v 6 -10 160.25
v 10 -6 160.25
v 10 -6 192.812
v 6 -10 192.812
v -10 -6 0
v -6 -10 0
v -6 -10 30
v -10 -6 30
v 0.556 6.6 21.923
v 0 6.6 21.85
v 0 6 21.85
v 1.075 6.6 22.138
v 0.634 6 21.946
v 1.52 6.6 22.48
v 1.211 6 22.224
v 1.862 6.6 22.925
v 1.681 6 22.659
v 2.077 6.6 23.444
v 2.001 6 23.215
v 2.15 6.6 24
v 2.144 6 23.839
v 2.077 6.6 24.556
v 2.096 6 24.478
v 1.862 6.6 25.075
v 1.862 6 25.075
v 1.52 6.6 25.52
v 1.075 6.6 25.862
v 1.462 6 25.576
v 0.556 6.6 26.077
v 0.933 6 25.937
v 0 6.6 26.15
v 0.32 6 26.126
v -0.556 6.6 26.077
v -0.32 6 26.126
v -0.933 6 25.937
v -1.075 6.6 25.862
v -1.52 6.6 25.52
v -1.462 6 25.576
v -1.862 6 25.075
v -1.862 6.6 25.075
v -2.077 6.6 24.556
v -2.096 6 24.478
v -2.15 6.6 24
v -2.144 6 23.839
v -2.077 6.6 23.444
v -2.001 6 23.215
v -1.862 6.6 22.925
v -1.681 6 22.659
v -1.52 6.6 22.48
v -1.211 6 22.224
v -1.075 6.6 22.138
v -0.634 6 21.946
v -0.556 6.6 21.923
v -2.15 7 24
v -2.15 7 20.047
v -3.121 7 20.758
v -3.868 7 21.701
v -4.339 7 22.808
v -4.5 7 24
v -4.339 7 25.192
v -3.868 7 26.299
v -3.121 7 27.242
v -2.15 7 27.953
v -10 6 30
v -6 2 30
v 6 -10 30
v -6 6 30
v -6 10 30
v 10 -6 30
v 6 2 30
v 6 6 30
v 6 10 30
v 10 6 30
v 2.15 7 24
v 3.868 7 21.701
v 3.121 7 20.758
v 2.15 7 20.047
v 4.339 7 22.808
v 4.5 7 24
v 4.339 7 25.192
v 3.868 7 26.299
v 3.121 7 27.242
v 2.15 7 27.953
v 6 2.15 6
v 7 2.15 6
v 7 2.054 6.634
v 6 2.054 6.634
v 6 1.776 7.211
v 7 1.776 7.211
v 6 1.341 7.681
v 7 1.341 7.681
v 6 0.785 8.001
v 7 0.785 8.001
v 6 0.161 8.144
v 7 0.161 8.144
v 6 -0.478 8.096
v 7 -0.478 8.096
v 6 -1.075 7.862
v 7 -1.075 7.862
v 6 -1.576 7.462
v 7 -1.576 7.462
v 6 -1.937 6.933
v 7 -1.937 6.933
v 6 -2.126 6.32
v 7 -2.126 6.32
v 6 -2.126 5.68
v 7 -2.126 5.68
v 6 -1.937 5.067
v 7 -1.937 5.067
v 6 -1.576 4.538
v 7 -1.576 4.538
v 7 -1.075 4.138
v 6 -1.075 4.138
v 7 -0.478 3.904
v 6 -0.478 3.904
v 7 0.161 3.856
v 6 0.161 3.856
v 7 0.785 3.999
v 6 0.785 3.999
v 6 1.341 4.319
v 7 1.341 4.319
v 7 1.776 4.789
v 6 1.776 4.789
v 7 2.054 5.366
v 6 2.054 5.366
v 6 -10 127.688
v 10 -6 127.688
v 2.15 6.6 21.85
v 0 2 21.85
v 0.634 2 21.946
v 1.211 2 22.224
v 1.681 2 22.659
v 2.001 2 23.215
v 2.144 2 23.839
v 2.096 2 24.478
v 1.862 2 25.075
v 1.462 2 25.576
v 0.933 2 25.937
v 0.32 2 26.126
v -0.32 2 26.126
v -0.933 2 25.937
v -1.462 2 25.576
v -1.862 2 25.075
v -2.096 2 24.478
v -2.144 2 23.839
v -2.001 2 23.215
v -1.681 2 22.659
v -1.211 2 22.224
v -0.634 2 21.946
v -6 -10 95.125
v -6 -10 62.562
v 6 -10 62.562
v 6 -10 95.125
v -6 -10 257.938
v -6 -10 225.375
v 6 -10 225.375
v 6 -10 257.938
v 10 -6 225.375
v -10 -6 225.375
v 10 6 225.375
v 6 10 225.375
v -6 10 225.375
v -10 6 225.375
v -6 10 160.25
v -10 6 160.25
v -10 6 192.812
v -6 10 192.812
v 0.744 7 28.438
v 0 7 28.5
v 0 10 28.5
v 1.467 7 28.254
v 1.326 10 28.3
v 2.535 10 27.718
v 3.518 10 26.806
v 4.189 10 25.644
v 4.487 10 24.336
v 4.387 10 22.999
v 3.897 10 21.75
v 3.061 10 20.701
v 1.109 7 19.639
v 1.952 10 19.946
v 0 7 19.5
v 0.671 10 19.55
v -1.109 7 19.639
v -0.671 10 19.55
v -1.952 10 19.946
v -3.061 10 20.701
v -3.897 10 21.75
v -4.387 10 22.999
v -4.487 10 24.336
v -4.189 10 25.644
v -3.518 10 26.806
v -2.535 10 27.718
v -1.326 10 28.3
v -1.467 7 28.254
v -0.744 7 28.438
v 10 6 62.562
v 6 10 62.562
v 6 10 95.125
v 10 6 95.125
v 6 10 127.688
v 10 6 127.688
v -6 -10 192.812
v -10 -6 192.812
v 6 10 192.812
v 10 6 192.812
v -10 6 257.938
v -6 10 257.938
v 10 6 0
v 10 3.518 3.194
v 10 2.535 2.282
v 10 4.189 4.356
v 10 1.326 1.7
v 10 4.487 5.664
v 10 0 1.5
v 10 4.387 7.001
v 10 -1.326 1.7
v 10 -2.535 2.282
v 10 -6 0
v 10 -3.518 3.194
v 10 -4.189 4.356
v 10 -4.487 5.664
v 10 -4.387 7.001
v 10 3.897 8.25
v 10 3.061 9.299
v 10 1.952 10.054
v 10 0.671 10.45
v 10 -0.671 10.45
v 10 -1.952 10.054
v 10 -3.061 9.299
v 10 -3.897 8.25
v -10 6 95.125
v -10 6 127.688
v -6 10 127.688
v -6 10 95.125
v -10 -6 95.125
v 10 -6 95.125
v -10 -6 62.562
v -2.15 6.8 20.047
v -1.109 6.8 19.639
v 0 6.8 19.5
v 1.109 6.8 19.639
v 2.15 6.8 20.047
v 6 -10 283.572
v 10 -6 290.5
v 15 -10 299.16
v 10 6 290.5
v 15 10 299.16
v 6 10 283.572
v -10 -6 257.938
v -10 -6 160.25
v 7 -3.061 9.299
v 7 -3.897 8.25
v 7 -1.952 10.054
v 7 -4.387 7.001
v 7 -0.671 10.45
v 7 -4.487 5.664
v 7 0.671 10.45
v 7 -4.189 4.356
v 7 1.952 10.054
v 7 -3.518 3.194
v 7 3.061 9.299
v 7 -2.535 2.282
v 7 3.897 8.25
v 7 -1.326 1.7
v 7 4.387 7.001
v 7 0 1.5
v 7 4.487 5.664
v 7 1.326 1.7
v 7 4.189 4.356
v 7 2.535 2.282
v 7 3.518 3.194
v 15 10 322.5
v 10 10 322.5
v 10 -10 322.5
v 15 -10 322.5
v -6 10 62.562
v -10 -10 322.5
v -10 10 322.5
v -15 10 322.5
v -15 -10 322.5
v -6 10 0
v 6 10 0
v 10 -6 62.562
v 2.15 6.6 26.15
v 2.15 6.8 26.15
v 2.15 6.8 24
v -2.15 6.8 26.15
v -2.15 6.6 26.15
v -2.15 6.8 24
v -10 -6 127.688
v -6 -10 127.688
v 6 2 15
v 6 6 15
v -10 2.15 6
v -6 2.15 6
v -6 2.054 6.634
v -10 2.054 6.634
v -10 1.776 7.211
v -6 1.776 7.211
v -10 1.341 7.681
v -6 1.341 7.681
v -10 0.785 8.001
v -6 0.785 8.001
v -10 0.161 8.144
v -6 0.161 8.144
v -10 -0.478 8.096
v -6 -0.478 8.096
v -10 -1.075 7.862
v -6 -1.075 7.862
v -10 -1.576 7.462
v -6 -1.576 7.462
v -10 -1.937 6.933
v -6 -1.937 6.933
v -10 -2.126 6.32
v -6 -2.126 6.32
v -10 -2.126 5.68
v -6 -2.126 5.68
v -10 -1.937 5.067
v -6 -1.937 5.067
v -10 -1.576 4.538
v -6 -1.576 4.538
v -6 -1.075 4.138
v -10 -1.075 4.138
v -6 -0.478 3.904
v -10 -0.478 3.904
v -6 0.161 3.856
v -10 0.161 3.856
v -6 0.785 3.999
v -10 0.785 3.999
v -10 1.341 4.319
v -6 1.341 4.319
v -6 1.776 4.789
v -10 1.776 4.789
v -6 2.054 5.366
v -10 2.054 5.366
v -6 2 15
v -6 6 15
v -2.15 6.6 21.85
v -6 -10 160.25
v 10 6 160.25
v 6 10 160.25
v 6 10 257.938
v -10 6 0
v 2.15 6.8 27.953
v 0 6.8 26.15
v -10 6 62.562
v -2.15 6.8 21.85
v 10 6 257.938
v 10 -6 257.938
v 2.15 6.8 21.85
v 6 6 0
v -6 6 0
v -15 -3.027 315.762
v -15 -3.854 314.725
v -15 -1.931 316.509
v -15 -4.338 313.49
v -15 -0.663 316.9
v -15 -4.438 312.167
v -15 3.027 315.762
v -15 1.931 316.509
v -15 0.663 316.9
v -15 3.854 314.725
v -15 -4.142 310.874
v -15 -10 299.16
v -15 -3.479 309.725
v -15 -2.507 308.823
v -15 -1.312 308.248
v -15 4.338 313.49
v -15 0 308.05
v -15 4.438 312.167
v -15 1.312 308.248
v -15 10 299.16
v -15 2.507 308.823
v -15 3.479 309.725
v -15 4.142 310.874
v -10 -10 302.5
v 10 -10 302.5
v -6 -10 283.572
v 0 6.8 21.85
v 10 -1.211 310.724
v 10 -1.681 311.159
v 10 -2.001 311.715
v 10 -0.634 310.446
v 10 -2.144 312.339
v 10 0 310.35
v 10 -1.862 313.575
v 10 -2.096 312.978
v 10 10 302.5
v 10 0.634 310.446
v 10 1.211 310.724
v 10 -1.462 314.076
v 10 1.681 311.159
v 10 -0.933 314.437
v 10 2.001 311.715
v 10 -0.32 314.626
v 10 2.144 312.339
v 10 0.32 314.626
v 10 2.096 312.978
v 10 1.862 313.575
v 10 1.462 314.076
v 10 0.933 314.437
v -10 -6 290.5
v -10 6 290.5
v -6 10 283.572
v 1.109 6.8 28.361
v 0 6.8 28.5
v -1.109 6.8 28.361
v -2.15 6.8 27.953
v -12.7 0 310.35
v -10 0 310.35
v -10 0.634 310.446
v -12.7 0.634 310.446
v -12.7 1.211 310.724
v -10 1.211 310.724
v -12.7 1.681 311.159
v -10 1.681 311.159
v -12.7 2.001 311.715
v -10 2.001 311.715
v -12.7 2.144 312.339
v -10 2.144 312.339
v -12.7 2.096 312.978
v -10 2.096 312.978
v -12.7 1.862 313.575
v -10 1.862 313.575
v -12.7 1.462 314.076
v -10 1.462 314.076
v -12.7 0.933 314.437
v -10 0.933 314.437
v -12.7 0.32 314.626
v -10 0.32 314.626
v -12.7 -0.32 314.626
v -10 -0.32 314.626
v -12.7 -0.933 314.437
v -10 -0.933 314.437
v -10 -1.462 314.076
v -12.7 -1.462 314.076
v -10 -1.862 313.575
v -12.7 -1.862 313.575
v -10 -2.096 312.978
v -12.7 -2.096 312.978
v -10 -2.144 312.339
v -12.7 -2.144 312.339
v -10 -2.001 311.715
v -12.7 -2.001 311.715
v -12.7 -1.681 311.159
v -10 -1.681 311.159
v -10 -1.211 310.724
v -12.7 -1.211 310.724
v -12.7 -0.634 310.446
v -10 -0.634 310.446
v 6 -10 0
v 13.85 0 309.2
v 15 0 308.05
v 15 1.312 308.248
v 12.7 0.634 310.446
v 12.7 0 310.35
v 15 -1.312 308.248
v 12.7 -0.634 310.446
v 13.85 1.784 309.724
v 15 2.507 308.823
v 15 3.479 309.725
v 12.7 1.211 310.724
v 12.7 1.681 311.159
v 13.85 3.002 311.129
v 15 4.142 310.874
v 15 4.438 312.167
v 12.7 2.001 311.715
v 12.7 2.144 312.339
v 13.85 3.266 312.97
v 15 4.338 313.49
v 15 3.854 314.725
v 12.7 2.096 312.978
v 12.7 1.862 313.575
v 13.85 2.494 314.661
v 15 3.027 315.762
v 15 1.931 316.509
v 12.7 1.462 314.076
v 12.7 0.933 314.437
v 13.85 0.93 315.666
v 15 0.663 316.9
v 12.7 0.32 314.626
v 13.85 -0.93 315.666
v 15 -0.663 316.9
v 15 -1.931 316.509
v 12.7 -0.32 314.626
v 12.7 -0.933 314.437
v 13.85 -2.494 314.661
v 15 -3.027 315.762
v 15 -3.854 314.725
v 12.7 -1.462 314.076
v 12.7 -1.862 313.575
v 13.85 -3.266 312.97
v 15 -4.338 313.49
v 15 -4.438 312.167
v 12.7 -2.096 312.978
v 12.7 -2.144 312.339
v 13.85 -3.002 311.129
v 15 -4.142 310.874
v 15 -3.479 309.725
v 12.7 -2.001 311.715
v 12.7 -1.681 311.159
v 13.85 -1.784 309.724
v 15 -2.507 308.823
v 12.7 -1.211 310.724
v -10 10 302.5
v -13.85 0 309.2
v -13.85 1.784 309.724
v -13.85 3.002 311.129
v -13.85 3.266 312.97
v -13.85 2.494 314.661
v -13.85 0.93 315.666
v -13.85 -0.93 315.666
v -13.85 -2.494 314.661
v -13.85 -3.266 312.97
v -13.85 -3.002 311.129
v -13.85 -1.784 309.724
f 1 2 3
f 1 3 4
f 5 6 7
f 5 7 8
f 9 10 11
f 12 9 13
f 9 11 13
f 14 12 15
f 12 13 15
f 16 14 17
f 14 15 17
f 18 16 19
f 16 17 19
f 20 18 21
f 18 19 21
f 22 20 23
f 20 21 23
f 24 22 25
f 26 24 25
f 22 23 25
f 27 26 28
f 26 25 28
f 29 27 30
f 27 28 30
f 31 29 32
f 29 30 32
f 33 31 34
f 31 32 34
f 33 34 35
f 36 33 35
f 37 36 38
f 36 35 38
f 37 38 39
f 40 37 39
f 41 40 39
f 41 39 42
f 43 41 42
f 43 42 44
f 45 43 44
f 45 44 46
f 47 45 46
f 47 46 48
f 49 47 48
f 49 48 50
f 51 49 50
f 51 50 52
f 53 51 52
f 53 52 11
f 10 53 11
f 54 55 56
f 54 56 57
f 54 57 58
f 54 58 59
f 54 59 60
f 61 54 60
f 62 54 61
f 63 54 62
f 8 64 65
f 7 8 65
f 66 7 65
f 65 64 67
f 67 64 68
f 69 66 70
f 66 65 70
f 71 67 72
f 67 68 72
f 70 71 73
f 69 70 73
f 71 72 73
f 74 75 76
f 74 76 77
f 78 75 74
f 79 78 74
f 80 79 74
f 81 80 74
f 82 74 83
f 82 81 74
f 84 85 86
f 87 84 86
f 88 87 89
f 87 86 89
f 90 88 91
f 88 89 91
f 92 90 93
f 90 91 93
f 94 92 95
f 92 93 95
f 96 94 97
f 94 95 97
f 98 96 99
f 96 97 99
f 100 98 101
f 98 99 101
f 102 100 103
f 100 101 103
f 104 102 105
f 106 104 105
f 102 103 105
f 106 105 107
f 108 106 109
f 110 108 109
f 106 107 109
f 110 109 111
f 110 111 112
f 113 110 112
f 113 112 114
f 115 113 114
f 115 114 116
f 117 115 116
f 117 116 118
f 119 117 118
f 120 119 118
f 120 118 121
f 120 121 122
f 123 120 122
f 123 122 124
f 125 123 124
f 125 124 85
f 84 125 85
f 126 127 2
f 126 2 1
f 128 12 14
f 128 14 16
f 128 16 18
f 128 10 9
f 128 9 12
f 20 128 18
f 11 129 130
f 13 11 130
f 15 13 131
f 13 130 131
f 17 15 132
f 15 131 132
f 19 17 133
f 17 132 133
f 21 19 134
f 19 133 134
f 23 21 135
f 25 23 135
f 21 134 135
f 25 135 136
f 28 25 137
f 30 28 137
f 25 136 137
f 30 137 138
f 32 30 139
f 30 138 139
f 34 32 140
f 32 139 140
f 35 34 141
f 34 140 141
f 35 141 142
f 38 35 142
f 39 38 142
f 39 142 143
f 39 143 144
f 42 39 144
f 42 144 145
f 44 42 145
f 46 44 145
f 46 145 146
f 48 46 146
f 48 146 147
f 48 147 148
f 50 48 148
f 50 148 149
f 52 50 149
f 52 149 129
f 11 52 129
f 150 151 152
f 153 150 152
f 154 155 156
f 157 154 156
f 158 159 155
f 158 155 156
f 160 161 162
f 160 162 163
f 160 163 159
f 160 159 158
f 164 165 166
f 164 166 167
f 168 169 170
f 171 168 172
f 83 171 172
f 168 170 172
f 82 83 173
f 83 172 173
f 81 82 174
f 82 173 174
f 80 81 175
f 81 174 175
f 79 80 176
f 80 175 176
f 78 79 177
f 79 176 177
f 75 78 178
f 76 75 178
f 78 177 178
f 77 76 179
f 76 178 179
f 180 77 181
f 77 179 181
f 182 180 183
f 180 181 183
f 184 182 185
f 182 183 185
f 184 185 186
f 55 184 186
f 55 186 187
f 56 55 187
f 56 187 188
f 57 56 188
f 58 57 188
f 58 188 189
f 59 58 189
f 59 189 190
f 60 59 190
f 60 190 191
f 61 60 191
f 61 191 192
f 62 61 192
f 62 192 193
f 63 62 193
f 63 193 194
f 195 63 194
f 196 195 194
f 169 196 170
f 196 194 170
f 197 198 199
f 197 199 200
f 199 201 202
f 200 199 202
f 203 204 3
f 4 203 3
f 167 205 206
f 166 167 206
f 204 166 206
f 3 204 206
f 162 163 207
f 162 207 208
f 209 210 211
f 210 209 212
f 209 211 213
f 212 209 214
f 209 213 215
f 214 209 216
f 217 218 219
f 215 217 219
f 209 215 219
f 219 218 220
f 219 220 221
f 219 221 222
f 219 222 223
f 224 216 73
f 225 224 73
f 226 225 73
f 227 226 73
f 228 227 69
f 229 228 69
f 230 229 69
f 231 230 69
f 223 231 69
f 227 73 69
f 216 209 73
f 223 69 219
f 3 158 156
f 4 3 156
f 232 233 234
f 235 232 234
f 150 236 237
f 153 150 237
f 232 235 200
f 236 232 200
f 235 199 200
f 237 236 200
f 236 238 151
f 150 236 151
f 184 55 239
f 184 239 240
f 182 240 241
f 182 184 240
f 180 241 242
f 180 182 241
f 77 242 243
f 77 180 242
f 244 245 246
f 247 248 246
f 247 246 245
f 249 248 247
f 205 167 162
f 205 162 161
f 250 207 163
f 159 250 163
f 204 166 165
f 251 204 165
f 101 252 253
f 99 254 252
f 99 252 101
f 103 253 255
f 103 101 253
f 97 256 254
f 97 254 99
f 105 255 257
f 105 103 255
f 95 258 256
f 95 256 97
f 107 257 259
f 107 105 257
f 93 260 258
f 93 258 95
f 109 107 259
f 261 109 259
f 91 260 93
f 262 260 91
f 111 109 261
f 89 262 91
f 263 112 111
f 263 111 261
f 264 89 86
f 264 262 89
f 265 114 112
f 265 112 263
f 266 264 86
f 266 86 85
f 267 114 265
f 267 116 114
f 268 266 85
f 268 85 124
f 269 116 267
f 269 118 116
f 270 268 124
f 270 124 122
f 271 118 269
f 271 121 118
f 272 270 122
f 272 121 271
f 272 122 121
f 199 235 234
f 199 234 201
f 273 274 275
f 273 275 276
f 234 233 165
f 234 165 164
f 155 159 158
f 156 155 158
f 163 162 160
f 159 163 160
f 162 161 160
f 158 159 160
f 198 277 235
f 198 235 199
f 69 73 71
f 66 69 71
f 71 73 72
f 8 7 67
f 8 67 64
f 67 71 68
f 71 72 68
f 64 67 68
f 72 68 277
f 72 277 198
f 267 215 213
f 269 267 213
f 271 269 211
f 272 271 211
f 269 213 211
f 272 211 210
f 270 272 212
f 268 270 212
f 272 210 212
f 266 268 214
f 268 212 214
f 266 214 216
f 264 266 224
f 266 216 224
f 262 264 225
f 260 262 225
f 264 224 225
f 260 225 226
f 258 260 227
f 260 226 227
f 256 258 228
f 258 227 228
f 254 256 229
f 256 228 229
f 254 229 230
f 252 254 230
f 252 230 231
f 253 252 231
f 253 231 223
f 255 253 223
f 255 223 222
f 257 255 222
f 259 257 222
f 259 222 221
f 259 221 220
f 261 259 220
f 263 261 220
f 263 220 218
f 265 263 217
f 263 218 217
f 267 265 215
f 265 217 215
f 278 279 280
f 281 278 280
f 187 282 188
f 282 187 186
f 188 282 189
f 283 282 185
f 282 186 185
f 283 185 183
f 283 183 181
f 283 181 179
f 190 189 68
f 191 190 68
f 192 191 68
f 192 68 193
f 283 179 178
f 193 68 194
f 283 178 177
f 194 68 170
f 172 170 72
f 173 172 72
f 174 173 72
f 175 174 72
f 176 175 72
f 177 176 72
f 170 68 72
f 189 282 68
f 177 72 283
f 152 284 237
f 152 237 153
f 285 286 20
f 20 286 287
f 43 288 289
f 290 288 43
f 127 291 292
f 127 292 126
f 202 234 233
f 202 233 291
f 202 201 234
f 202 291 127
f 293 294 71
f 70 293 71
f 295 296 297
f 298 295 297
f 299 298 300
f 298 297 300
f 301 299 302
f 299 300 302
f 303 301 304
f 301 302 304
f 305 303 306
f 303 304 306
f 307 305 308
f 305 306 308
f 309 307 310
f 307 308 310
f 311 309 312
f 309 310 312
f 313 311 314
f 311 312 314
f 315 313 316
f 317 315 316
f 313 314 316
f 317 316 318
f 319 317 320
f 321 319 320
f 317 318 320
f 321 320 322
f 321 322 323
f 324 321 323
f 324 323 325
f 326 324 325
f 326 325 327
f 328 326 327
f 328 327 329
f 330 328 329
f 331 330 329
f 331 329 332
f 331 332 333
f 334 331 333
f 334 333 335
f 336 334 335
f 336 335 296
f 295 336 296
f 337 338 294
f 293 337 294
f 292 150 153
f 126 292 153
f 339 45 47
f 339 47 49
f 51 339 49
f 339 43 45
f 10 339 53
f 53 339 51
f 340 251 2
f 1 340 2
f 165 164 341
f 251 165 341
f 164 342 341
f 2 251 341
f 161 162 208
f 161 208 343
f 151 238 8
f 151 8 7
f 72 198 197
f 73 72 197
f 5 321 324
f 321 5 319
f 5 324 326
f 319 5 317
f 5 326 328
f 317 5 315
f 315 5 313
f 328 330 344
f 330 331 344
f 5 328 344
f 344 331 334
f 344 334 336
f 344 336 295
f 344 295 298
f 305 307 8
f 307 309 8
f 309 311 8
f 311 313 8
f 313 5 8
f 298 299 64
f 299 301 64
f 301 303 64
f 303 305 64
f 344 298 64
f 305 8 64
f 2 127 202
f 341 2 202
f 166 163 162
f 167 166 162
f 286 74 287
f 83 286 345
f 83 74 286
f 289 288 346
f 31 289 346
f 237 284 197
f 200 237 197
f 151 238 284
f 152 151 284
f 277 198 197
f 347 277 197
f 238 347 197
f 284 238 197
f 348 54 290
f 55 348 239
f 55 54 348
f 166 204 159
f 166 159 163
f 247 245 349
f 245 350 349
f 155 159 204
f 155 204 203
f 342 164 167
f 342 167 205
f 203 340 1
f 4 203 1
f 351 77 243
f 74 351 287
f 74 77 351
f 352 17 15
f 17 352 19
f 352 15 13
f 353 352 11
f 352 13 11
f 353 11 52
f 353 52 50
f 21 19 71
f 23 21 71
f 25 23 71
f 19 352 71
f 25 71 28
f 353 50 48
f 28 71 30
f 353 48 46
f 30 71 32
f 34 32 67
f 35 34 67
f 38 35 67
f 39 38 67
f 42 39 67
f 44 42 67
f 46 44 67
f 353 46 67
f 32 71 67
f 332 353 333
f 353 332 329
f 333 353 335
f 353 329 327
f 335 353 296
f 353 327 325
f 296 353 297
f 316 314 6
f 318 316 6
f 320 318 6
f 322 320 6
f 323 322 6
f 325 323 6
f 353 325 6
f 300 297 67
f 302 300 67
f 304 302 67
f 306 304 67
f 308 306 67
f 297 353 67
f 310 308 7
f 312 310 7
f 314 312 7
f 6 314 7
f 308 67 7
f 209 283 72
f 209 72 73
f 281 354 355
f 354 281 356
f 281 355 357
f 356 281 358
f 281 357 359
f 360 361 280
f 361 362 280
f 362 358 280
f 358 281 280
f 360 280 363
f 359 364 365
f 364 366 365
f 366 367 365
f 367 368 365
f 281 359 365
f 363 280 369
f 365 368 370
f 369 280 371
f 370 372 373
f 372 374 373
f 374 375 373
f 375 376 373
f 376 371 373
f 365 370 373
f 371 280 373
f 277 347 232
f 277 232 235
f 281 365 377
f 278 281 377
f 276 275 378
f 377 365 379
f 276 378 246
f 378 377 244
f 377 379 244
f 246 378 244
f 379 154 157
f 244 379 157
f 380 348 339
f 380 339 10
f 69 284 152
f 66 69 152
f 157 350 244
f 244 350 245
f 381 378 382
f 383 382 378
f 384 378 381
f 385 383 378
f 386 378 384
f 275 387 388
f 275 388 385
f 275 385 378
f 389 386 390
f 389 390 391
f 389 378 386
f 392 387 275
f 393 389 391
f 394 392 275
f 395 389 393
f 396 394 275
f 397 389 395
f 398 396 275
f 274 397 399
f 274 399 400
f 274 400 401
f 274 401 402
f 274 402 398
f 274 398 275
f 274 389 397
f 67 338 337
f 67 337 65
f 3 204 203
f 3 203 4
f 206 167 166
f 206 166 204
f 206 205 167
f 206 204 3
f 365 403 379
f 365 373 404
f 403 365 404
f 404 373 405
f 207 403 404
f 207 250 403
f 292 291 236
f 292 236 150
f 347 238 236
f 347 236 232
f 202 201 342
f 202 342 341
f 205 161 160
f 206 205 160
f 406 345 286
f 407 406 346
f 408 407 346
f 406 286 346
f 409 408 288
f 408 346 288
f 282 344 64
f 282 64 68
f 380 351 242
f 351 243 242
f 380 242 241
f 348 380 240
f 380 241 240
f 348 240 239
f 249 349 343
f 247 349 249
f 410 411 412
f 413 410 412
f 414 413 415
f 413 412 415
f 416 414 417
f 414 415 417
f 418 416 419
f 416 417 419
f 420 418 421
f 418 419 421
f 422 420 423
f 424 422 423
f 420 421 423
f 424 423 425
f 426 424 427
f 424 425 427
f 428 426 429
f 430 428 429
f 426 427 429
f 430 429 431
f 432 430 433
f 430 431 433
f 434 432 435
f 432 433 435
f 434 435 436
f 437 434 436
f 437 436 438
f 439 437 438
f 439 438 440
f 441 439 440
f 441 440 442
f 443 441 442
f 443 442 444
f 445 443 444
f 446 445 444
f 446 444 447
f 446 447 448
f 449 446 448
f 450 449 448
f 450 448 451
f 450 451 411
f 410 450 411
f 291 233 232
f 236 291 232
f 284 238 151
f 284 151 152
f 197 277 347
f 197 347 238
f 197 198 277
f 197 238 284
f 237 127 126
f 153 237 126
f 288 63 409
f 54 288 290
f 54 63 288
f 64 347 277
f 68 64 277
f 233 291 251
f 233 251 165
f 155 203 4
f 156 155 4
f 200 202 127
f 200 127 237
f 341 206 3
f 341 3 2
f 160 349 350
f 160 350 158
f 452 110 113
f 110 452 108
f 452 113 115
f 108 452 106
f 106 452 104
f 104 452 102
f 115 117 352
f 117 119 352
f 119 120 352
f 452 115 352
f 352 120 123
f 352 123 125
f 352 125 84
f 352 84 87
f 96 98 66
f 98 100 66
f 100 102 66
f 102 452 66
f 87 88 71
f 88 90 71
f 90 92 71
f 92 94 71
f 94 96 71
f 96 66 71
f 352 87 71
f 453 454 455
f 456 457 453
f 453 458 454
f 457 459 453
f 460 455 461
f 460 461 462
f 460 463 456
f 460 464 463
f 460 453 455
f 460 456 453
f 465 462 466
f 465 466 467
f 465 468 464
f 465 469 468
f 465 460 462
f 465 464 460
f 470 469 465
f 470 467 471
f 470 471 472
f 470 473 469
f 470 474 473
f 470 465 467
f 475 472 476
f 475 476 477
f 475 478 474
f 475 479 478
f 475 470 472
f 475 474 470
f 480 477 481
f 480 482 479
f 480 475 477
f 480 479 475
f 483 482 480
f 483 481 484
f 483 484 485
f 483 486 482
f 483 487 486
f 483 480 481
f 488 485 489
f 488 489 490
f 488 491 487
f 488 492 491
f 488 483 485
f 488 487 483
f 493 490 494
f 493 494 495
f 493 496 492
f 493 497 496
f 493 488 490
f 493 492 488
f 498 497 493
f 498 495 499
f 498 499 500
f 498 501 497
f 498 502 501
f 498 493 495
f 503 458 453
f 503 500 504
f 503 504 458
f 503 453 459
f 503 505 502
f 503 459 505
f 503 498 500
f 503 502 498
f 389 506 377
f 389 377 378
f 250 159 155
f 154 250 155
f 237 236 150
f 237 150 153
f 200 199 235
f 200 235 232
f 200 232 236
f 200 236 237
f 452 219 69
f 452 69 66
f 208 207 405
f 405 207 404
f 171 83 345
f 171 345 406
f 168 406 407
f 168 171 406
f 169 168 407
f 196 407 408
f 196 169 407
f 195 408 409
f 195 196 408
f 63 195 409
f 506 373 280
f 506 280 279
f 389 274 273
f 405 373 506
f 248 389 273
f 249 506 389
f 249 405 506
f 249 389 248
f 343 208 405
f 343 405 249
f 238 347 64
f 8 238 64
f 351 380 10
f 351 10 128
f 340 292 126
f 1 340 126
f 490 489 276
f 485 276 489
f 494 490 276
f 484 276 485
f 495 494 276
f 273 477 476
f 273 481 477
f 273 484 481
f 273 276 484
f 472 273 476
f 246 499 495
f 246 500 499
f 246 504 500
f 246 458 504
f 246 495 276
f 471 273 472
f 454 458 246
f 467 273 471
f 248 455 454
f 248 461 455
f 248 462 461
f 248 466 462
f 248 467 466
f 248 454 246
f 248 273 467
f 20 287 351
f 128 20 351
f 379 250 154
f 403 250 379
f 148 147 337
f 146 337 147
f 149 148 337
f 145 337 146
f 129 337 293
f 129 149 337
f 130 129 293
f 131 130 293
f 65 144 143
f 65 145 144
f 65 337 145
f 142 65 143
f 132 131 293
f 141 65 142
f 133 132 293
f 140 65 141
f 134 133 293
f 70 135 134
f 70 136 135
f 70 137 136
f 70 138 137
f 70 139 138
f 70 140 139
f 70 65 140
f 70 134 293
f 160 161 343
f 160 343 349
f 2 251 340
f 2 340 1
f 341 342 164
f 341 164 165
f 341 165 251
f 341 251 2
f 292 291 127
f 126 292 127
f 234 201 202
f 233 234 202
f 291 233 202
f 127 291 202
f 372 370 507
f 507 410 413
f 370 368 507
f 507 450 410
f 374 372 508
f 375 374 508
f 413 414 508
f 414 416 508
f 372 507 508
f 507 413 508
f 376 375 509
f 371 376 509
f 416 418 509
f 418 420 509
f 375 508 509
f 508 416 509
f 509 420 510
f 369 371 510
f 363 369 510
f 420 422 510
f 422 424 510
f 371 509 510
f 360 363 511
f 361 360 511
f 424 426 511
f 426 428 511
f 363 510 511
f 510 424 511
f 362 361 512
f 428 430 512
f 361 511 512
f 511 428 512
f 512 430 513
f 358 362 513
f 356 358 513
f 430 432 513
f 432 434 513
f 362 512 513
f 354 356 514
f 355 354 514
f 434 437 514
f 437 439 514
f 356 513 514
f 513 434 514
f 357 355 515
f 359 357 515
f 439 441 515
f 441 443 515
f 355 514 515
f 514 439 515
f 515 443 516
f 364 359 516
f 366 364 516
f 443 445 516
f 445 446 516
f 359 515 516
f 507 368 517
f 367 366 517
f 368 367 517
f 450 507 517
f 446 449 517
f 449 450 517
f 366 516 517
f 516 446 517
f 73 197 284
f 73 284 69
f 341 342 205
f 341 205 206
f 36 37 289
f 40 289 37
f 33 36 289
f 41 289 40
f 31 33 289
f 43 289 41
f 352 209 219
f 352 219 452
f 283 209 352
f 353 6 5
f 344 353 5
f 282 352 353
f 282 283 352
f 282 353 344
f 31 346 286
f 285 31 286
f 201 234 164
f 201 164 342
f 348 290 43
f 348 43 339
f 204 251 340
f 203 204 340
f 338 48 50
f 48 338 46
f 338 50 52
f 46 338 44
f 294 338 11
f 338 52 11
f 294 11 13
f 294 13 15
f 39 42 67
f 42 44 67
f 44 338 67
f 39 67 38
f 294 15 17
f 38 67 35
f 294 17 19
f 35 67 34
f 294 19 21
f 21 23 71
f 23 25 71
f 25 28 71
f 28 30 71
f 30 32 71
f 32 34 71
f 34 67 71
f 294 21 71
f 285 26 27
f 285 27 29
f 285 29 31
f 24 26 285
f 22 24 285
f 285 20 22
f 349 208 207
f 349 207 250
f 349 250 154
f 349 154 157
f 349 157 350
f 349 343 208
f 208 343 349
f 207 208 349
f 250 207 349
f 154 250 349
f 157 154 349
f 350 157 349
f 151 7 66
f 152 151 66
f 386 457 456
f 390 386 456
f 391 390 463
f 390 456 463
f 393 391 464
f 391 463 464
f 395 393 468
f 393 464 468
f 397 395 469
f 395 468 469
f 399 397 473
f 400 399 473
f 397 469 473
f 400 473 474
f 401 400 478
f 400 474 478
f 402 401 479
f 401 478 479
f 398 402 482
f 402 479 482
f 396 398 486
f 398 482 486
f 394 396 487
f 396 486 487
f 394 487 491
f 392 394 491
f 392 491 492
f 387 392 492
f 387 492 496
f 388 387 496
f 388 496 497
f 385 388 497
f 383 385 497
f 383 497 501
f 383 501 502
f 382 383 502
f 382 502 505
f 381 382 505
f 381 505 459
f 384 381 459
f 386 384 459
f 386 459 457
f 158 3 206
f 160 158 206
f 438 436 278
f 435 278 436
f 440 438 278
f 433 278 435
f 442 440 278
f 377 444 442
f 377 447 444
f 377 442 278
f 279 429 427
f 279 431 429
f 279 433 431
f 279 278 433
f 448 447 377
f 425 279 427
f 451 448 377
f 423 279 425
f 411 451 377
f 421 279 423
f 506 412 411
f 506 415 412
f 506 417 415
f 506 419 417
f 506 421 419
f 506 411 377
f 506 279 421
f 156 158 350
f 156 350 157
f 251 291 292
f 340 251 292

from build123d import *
from build123d.topology import SkipClean

# Parameters (mm, degrees)
SKETCH1_W             = 20
SKETCH1_H             = 20
BOSS_EXTRUDE1_DEPTH   = 302.5
BOSS_EXTRUDE2_DEPTH   = 20
SKETCH3_R             = 2.15
CUT_EXTRUDE1_DEPTH    = 325.046678736
SKETCH4_W             = 4
SKETCH4_H             = 30
CUT_EXTRUDE2_DEPTH    = 324.467540875
CHAMFER1_SIZE         = 2.3
SKETCH5_W             = 15
SKETCH5_H             = 8
CUT_EXTRUDE3_DEPTH    = 324.337671792
SKETCH6_R             = 3.2
CUT_EXTRUDE4_DEPTH    = 324.071586494
SKETCH7_R             = 3.2
CUT_EXTRUDE5_DEPTH    = 324.337671792
SKETCH10_W            = 20
SKETCH10_H            = 32.5625
CUT_EXTRUDE7_DEPTH    = 324.467540875
SKETCH11_W            = 20
SKETCH11_H            = 32.5625
BOSS_EXTRUDE3_DEPTH   = 20
BOSS_EXTRUDE3_2_DEPTH = 20
BOSS_EXTRUDE3_3_DEPTH = 20
BOSS_EXTRUDE3_4_DEPTH = 20
CHAMFER3_SIZE         = 4
CUT_EXTRUDE8_DEPTH    = 227.9375
SKETCH13_W            = 15
SKETCH13_H            = 4
CUT_EXTRUDE9_DEPTH    = 324.337671792
SKETCH15_W            = 12
SKETCH15_H            = 16
CUT_EXTRUDE10_DEPTH   = 30
BOSS_EXTRUDE4_DEPTH   = 30
SKETCH16_W            = 12
SKETCH16_H            = 15
BOSS_EXTRUDE5_DEPTH   = 4
SKETCH17_R            = 2.15
CUT_EXTRUDE11_DEPTH   = 324.071586494
SKETCH18_R            = 2.15
CUT_EXTRUDE12_DEPTH   = 324.622078975
SKETCH19_R            = 4.5
CUT_EXTRUDE13_DEPTH   = 3
SKETCH20_R            = 4.5
CUT_EXTRUDE14_DEPTH   = 3
CUT_EXTRUDE15_DEPTH   = 0.2
SKETCH22_W            = 4.3
SKETCH22_H            = 4.3
CUT_EXTRUDE16_DEPTH   = 0.2


with BuildPart() as part:
    # Sketch1 → Boss-Extrude1 (new body)
    with BuildSketch(Plane.XY):
        Rectangle(SKETCH1_W, SKETCH1_H)
    extrude(amount=BOSS_EXTRUDE1_DEPTH)

    # Sketch2 → Boss-Extrude2 (add)
    with BuildSketch(Plane(origin=(0, 10, 0), x_dir=(1, 0, 0), z_dir=(0, 1, 0))):
        Polygon((10, -302.5), (10, -322.5), (15, -322.5), (15, -299.160254038), (10, -290.5), align=None)
        Polygon((-10, -290.5), (-10, -302.5), (-10, -322.5), (-15, -322.5), (-15, -299.160254038), align=None)
    extrude(amount=-BOSS_EXTRUDE2_DEPTH)

    # Sketch3 → Cut-Extrude1 (cut, through all)
    with BuildSketch(Plane(origin=(15, 0, 0), x_dir=(0, 0, -1), z_dir=(1, 0, 0))):
        with Locations((-312.5, 0)):
            Circle(SKETCH3_R)
    extrude(amount=-CUT_EXTRUDE1_DEPTH, mode=Mode.SUBTRACT)

    # Sketch4 → Cut-Extrude2 (cut, through all)
    with BuildSketch(Plane(origin=(0, 10, 0), x_dir=(1, 0, 0), z_dir=(0, 1, 0))):
        with Locations((-8, -15)):
            Rectangle(SKETCH4_W, SKETCH4_H)
        with Locations((8, -15)):
            Rectangle(SKETCH4_W, SKETCH4_H)
    extrude(amount=-CUT_EXTRUDE2_DEPTH, mode=Mode.SUBTRACT)

    # Chamfer1
    chamfer1_edges = [part.edges().sort_by_distance(p)[0] for p in [
        (-15, 0, 314.65),
        (15, 0, 314.65),
    ]]
    chamfer(chamfer1_edges, length=CHAMFER1_SIZE)

    # Sketch5 → Cut-Extrude3 (cut, through all)
    with BuildSketch(Plane(origin=(6, 0, 0), x_dir=(0, 0, -1), z_dir=(1, 0, 0))):
        with Locations((-7.5, 6)):
            Rectangle(SKETCH5_W, SKETCH5_H)
    extrude(amount=-CUT_EXTRUDE3_DEPTH, mode=Mode.SUBTRACT)

    # Sketch6 → Cut-Extrude4 (cut, through all)
    with BuildSketch(Plane(origin=(0, 2, 0), x_dir=(1, 0, 0), z_dir=(0, 1, 0))):
        with Locations(Location((0, -6, 0), (0, 0, 270))):
            Circle(SKETCH6_R)
    extrude(amount=-CUT_EXTRUDE4_DEPTH, mode=Mode.SUBTRACT)

    # Sketch7 → Cut-Extrude5 (cut, through all)
    with BuildSketch(Plane(origin=(6, 0, 0), x_dir=(0, 0, -1), z_dir=(1, 0, 0))):
        with Locations((-24, 0)):
            Circle(SKETCH7_R)
    extrude(amount=-CUT_EXTRUDE5_DEPTH, mode=Mode.SUBTRACT)

    # Sketch10 → Cut-Extrude7 (cut, through all)
    with BuildSketch(Plane(origin=(0, 10, 0), x_dir=(1, 0, 0), z_dir=(0, 1, 0))):
        with Locations((0, -46.28125)):
            Rectangle(SKETCH10_W, SKETCH10_H)
        with Locations((0, -111.40625)):
            Rectangle(SKETCH10_W, SKETCH10_H)
        with Locations((0, -176.53125)):
            Rectangle(SKETCH10_W, SKETCH10_H)
        with Locations((0, -241.65625)):
            Rectangle(SKETCH10_W, SKETCH10_H)
    extrude(amount=-CUT_EXTRUDE7_DEPTH, mode=Mode.SUBTRACT)


with BuildPart() as cut_extrude7_piece_1:
    # of the separate pieces the step leaves, piece 1, a body of its own (cut_extrude7_pieces)
    add(part.part.solids().sort_by_distance((15, 0, 308.05))[0])

    # Chamfer3
    chamfer3_edges = [cut_extrude7_piece_1.edges().sort_by_distance(p)[0] for p in [
        (10, 10, 274.21875),
        (-10, 10, 274.21875),
        (-10, -10, 274.21875),
        (10, -10, 274.21875),
    ]]
    chamfer(chamfer3_edges, length=CHAMFER3_SIZE)


with BuildPart() as cut_extrude7_piece_2:
    # of the separate pieces the step leaves, piece 2, a body of its own (cut_extrude7_pieces)
    add(part.part.solids().sort_by_distance((10, 10, 192.8125))[0])


with BuildPart() as cut_extrude7_piece_3:
    # of the separate pieces the step leaves, piece 3, a body of its own (cut_extrude7_pieces)
    add(part.part.solids().sort_by_distance((10, 10, 62.5625))[0])


with BuildPart() as cut_extrude7_piece_4:
    # of the separate pieces the step leaves, piece 4, a body of its own (cut_extrude7_pieces)
    add(part.part.solids().sort_by_distance((-10, 10, 127.6875))[0])


with BuildPart() as cut_extrude7_piece_5:
    # of the separate pieces the step leaves, piece 5, a body of its own (cut_extrude7_pieces)
    add(part.part.solids().sort_by_distance((6, 10, 15))[0])

    # Sketch13 → Cut-Extrude9 (cut, through all)
    with BuildSketch(Plane(origin=(6, 0, 0), x_dir=(0, 0, -1), z_dir=(1, 0, 0))):
        with Locations((-22.5, 8)):
            Rectangle(SKETCH13_W, SKETCH13_H)
    extrude(amount=-CUT_EXTRUDE9_DEPTH, mode=Mode.SUBTRACT)

    # Sketch15 → Cut-Extrude10 (cut)
    with BuildSketch(Plane(origin=(0, 0, 0), x_dir=(-1, 0, 0), z_dir=(0, 0, -1))):
        with Locations((0, -2)):
            Rectangle(SKETCH15_W, SKETCH15_H)
    extrude(amount=-CUT_EXTRUDE10_DEPTH, mode=Mode.SUBTRACT)


with BuildPart() as body_6:
    # Sketch11 → Boss-Extrude3 (new body)
    with BuildSketch(Plane(origin=(0, 10, 0), x_dir=(1, 0, 0), z_dir=(0, 1, 0))):
        with Locations((0, -46.28125)):
            Rectangle(SKETCH11_W, SKETCH11_H)
    extrude(amount=-BOSS_EXTRUDE3_DEPTH)


with BuildPart() as body_7:
    # Sketch11 → Boss-Extrude3 2 (new body)
    with BuildSketch(Plane(origin=(0, 10, 0), x_dir=(1, 0, 0), z_dir=(0, 1, 0))):
        with Locations((0, -111.40625)):
            Rectangle(SKETCH11_W, SKETCH11_H)
    extrude(amount=-BOSS_EXTRUDE3_2_DEPTH)


with BuildPart() as body_8:
    # Sketch11 → Boss-Extrude3 3 (new body)
    with BuildSketch(Plane(origin=(0, 10, 0), x_dir=(1, 0, 0), z_dir=(0, 1, 0))):
        with Locations((0, -176.53125)):
            Rectangle(SKETCH11_W, SKETCH11_H)
    extrude(amount=-BOSS_EXTRUDE3_3_DEPTH)


with BuildPart() as body_9:
    # Sketch11 → Boss-Extrude3 4 (new body)
    with BuildSketch(Plane(origin=(0, 10, 0), x_dir=(1, 0, 0), z_dir=(0, 1, 0))):
        with Locations((0, -241.65625)):
            Rectangle(SKETCH11_W, SKETCH11_H)
    extrude(amount=-BOSS_EXTRUDE3_4_DEPTH)


with BuildPart() as cut_extrude8_tool:
    # Sketch12 → Cut-Extrude8 (new body)
    with BuildSketch(Plane(origin=(0, 0, 30), x_dir=(-1, 0, 0), z_dir=(0, 0, -1))):
        Polygon((-10, 10), (-6, 10), (-10, 6), align=None)
        Polygon((-10, -10), (-10, -6), (-6, -10), align=None)
        Polygon((6, 10), (10, 10), (10, 6), align=None)
        Polygon((10, -10), (10, -6), (6, -10), align=None)
    extrude(amount=-CUT_EXTRUDE8_DEPTH)


with BuildPart() as cut_extrude7_piece_2_1:
    add(cut_extrude7_piece_2.part)

    # Cut-Extrude8: cut by cut_extrude8_tool
    add(cut_extrude8_tool.part, mode=Mode.SUBTRACT)


with BuildPart() as cut_extrude7_piece_3_1:
    add(cut_extrude7_piece_3.part)

    # Cut-Extrude8: cut by cut_extrude8_tool
    add(cut_extrude8_tool.part, mode=Mode.SUBTRACT)


with BuildPart() as cut_extrude7_piece_4_1:
    add(cut_extrude7_piece_4.part)

    # Cut-Extrude8: cut by cut_extrude8_tool
    add(cut_extrude8_tool.part, mode=Mode.SUBTRACT)


with BuildPart() as body_6_1:
    add(body_6.part)

    # Cut-Extrude8: cut by cut_extrude8_tool
    add(cut_extrude8_tool.part, mode=Mode.SUBTRACT)

    # Sketch16 → Boss-Extrude5 (add)
    with BuildSketch(Plane.XZ.offset(-6)):
        with Locations((0, 22.5)):
            Rectangle(SKETCH16_W, SKETCH16_H)
    extrude(amount=BOSS_EXTRUDE5_DEPTH)


with BuildPart() as body_7_1:
    add(body_7.part)

    # Cut-Extrude8: cut by cut_extrude8_tool
    add(cut_extrude8_tool.part, mode=Mode.SUBTRACT)


with BuildPart() as body_8_1:
    add(body_8.part)

    # Cut-Extrude8: cut by cut_extrude8_tool
    add(cut_extrude8_tool.part, mode=Mode.SUBTRACT)


with BuildPart() as body_9_1:
    add(body_9.part)

    # Cut-Extrude8: cut by cut_extrude8_tool
    add(cut_extrude8_tool.part, mode=Mode.SUBTRACT)


with BuildPart() as body_9_2:
    # Sketch14 → Boss-Extrude4 (new body)
    with BuildSketch(Plane(origin=(0, 0, 30), x_dir=(-1, 0, 0), z_dir=(0, 0, -1))):
        Polygon((-6, -10), (-6, 6), (6, 6), (6, -10), (10, -6), (10, 6), (6, 10), (-6, 10), (-10, 6), (-10, -6), align=None)
    extrude(amount=BOSS_EXTRUDE4_DEPTH)


with BuildPart() as cut_extrude11_tool:
    # Sketch17 → Cut-Extrude11 (new, through all)
    with BuildSketch(Plane.XZ.offset(-2)):
        with Locations(Location((0, 24, 0), (0, 0, 270))):
            Circle(SKETCH17_R)
    extrude(amount=-CUT_EXTRUDE11_DEPTH)


with BuildPart() as body_6_2:
    add(body_6_1.part)

    # Cut-Extrude11: cut by cut_extrude11_tool
    add(cut_extrude11_tool.part, mode=Mode.SUBTRACT)


with BuildPart() as body_9_2_1:
    add(body_9_2.part)

    # Cut-Extrude11: cut by cut_extrude11_tool
    add(cut_extrude11_tool.part, mode=Mode.SUBTRACT)

    # Sketch18 → Cut-Extrude12 (cut, through all)
    with BuildSketch(Plane(origin=(10, 0, 0), x_dir=(0, 0, -1), z_dir=(1, 0, 0))):
        with Locations(Location((-6, 0, 0), (0, 0, 90))):
            Circle(SKETCH18_R)
    extrude(amount=-CUT_EXTRUDE12_DEPTH, mode=Mode.SUBTRACT)

    # Sketch19 → Cut-Extrude13 (cut)
    with BuildSketch(Plane(origin=(10, 0, 0), x_dir=(0, 0, -1), z_dir=(1, 0, 0))):
        with Locations((-6, 0)):
            Circle(SKETCH19_R)
    extrude(amount=-CUT_EXTRUDE13_DEPTH, mode=Mode.SUBTRACT)

    # Sketch20 → Cut-Extrude14 (cut)
    with BuildSketch(Plane(origin=(0, 10, 0), x_dir=(1, 0, 0), z_dir=(0, 1, 0))):
        with Locations(Location((0, -24, 0), (0, 0, 270))):
            Circle(SKETCH20_R)
    extrude(amount=-CUT_EXTRUDE14_DEPTH, mode=Mode.SUBTRACT)

    # Sketch21 → Cut-Extrude15 (cut)
    with SkipClean():  # the faces are left unmerged after this step: merging them gives an invalid solid
        with BuildSketch(Plane(origin=(0, 7, 0), x_dir=(1, 0, 0), z_dir=(0, 1, 0))):
            with BuildLine():
                Line((-2.15, -27.95316329), (-2.15, -20.04683671))
                ThreePointArc((-2.15, -20.04683671), (0, -19.5), (2.15, -20.04683671))
                Line((2.15, -20.04683671), (2.15, -27.95316329))
                ThreePointArc((2.15, -27.95316329), (0, -28.5), (-2.15, -27.95316329))
            make_face()
        extrude(amount=-CUT_EXTRUDE15_DEPTH, mode=Mode.SUBTRACT)

    # Sketch22 → Cut-Extrude16 (cut)
    with SkipClean():  # the faces are left unmerged after this step: merging them gives an invalid solid
        with BuildSketch(Plane(origin=(0, 6.8, 0), x_dir=(1, 0, 0), z_dir=(0, 1, 0))):
            with Locations((0, -24)):
                Rectangle(SKETCH22_W, SKETCH22_H)
        extrude(amount=-CUT_EXTRUDE16_DEPTH, mode=Mode.SUBTRACT)


solid = Compound([cut_extrude7_piece_1.part, cut_extrude7_piece_2_1.part, cut_extrude7_piece_3_1.part, cut_extrude7_piece_4_1.part, body_7_1.part, body_8_1.part, body_9_1.part, body_6_2.part, body_9_2_1.part])
